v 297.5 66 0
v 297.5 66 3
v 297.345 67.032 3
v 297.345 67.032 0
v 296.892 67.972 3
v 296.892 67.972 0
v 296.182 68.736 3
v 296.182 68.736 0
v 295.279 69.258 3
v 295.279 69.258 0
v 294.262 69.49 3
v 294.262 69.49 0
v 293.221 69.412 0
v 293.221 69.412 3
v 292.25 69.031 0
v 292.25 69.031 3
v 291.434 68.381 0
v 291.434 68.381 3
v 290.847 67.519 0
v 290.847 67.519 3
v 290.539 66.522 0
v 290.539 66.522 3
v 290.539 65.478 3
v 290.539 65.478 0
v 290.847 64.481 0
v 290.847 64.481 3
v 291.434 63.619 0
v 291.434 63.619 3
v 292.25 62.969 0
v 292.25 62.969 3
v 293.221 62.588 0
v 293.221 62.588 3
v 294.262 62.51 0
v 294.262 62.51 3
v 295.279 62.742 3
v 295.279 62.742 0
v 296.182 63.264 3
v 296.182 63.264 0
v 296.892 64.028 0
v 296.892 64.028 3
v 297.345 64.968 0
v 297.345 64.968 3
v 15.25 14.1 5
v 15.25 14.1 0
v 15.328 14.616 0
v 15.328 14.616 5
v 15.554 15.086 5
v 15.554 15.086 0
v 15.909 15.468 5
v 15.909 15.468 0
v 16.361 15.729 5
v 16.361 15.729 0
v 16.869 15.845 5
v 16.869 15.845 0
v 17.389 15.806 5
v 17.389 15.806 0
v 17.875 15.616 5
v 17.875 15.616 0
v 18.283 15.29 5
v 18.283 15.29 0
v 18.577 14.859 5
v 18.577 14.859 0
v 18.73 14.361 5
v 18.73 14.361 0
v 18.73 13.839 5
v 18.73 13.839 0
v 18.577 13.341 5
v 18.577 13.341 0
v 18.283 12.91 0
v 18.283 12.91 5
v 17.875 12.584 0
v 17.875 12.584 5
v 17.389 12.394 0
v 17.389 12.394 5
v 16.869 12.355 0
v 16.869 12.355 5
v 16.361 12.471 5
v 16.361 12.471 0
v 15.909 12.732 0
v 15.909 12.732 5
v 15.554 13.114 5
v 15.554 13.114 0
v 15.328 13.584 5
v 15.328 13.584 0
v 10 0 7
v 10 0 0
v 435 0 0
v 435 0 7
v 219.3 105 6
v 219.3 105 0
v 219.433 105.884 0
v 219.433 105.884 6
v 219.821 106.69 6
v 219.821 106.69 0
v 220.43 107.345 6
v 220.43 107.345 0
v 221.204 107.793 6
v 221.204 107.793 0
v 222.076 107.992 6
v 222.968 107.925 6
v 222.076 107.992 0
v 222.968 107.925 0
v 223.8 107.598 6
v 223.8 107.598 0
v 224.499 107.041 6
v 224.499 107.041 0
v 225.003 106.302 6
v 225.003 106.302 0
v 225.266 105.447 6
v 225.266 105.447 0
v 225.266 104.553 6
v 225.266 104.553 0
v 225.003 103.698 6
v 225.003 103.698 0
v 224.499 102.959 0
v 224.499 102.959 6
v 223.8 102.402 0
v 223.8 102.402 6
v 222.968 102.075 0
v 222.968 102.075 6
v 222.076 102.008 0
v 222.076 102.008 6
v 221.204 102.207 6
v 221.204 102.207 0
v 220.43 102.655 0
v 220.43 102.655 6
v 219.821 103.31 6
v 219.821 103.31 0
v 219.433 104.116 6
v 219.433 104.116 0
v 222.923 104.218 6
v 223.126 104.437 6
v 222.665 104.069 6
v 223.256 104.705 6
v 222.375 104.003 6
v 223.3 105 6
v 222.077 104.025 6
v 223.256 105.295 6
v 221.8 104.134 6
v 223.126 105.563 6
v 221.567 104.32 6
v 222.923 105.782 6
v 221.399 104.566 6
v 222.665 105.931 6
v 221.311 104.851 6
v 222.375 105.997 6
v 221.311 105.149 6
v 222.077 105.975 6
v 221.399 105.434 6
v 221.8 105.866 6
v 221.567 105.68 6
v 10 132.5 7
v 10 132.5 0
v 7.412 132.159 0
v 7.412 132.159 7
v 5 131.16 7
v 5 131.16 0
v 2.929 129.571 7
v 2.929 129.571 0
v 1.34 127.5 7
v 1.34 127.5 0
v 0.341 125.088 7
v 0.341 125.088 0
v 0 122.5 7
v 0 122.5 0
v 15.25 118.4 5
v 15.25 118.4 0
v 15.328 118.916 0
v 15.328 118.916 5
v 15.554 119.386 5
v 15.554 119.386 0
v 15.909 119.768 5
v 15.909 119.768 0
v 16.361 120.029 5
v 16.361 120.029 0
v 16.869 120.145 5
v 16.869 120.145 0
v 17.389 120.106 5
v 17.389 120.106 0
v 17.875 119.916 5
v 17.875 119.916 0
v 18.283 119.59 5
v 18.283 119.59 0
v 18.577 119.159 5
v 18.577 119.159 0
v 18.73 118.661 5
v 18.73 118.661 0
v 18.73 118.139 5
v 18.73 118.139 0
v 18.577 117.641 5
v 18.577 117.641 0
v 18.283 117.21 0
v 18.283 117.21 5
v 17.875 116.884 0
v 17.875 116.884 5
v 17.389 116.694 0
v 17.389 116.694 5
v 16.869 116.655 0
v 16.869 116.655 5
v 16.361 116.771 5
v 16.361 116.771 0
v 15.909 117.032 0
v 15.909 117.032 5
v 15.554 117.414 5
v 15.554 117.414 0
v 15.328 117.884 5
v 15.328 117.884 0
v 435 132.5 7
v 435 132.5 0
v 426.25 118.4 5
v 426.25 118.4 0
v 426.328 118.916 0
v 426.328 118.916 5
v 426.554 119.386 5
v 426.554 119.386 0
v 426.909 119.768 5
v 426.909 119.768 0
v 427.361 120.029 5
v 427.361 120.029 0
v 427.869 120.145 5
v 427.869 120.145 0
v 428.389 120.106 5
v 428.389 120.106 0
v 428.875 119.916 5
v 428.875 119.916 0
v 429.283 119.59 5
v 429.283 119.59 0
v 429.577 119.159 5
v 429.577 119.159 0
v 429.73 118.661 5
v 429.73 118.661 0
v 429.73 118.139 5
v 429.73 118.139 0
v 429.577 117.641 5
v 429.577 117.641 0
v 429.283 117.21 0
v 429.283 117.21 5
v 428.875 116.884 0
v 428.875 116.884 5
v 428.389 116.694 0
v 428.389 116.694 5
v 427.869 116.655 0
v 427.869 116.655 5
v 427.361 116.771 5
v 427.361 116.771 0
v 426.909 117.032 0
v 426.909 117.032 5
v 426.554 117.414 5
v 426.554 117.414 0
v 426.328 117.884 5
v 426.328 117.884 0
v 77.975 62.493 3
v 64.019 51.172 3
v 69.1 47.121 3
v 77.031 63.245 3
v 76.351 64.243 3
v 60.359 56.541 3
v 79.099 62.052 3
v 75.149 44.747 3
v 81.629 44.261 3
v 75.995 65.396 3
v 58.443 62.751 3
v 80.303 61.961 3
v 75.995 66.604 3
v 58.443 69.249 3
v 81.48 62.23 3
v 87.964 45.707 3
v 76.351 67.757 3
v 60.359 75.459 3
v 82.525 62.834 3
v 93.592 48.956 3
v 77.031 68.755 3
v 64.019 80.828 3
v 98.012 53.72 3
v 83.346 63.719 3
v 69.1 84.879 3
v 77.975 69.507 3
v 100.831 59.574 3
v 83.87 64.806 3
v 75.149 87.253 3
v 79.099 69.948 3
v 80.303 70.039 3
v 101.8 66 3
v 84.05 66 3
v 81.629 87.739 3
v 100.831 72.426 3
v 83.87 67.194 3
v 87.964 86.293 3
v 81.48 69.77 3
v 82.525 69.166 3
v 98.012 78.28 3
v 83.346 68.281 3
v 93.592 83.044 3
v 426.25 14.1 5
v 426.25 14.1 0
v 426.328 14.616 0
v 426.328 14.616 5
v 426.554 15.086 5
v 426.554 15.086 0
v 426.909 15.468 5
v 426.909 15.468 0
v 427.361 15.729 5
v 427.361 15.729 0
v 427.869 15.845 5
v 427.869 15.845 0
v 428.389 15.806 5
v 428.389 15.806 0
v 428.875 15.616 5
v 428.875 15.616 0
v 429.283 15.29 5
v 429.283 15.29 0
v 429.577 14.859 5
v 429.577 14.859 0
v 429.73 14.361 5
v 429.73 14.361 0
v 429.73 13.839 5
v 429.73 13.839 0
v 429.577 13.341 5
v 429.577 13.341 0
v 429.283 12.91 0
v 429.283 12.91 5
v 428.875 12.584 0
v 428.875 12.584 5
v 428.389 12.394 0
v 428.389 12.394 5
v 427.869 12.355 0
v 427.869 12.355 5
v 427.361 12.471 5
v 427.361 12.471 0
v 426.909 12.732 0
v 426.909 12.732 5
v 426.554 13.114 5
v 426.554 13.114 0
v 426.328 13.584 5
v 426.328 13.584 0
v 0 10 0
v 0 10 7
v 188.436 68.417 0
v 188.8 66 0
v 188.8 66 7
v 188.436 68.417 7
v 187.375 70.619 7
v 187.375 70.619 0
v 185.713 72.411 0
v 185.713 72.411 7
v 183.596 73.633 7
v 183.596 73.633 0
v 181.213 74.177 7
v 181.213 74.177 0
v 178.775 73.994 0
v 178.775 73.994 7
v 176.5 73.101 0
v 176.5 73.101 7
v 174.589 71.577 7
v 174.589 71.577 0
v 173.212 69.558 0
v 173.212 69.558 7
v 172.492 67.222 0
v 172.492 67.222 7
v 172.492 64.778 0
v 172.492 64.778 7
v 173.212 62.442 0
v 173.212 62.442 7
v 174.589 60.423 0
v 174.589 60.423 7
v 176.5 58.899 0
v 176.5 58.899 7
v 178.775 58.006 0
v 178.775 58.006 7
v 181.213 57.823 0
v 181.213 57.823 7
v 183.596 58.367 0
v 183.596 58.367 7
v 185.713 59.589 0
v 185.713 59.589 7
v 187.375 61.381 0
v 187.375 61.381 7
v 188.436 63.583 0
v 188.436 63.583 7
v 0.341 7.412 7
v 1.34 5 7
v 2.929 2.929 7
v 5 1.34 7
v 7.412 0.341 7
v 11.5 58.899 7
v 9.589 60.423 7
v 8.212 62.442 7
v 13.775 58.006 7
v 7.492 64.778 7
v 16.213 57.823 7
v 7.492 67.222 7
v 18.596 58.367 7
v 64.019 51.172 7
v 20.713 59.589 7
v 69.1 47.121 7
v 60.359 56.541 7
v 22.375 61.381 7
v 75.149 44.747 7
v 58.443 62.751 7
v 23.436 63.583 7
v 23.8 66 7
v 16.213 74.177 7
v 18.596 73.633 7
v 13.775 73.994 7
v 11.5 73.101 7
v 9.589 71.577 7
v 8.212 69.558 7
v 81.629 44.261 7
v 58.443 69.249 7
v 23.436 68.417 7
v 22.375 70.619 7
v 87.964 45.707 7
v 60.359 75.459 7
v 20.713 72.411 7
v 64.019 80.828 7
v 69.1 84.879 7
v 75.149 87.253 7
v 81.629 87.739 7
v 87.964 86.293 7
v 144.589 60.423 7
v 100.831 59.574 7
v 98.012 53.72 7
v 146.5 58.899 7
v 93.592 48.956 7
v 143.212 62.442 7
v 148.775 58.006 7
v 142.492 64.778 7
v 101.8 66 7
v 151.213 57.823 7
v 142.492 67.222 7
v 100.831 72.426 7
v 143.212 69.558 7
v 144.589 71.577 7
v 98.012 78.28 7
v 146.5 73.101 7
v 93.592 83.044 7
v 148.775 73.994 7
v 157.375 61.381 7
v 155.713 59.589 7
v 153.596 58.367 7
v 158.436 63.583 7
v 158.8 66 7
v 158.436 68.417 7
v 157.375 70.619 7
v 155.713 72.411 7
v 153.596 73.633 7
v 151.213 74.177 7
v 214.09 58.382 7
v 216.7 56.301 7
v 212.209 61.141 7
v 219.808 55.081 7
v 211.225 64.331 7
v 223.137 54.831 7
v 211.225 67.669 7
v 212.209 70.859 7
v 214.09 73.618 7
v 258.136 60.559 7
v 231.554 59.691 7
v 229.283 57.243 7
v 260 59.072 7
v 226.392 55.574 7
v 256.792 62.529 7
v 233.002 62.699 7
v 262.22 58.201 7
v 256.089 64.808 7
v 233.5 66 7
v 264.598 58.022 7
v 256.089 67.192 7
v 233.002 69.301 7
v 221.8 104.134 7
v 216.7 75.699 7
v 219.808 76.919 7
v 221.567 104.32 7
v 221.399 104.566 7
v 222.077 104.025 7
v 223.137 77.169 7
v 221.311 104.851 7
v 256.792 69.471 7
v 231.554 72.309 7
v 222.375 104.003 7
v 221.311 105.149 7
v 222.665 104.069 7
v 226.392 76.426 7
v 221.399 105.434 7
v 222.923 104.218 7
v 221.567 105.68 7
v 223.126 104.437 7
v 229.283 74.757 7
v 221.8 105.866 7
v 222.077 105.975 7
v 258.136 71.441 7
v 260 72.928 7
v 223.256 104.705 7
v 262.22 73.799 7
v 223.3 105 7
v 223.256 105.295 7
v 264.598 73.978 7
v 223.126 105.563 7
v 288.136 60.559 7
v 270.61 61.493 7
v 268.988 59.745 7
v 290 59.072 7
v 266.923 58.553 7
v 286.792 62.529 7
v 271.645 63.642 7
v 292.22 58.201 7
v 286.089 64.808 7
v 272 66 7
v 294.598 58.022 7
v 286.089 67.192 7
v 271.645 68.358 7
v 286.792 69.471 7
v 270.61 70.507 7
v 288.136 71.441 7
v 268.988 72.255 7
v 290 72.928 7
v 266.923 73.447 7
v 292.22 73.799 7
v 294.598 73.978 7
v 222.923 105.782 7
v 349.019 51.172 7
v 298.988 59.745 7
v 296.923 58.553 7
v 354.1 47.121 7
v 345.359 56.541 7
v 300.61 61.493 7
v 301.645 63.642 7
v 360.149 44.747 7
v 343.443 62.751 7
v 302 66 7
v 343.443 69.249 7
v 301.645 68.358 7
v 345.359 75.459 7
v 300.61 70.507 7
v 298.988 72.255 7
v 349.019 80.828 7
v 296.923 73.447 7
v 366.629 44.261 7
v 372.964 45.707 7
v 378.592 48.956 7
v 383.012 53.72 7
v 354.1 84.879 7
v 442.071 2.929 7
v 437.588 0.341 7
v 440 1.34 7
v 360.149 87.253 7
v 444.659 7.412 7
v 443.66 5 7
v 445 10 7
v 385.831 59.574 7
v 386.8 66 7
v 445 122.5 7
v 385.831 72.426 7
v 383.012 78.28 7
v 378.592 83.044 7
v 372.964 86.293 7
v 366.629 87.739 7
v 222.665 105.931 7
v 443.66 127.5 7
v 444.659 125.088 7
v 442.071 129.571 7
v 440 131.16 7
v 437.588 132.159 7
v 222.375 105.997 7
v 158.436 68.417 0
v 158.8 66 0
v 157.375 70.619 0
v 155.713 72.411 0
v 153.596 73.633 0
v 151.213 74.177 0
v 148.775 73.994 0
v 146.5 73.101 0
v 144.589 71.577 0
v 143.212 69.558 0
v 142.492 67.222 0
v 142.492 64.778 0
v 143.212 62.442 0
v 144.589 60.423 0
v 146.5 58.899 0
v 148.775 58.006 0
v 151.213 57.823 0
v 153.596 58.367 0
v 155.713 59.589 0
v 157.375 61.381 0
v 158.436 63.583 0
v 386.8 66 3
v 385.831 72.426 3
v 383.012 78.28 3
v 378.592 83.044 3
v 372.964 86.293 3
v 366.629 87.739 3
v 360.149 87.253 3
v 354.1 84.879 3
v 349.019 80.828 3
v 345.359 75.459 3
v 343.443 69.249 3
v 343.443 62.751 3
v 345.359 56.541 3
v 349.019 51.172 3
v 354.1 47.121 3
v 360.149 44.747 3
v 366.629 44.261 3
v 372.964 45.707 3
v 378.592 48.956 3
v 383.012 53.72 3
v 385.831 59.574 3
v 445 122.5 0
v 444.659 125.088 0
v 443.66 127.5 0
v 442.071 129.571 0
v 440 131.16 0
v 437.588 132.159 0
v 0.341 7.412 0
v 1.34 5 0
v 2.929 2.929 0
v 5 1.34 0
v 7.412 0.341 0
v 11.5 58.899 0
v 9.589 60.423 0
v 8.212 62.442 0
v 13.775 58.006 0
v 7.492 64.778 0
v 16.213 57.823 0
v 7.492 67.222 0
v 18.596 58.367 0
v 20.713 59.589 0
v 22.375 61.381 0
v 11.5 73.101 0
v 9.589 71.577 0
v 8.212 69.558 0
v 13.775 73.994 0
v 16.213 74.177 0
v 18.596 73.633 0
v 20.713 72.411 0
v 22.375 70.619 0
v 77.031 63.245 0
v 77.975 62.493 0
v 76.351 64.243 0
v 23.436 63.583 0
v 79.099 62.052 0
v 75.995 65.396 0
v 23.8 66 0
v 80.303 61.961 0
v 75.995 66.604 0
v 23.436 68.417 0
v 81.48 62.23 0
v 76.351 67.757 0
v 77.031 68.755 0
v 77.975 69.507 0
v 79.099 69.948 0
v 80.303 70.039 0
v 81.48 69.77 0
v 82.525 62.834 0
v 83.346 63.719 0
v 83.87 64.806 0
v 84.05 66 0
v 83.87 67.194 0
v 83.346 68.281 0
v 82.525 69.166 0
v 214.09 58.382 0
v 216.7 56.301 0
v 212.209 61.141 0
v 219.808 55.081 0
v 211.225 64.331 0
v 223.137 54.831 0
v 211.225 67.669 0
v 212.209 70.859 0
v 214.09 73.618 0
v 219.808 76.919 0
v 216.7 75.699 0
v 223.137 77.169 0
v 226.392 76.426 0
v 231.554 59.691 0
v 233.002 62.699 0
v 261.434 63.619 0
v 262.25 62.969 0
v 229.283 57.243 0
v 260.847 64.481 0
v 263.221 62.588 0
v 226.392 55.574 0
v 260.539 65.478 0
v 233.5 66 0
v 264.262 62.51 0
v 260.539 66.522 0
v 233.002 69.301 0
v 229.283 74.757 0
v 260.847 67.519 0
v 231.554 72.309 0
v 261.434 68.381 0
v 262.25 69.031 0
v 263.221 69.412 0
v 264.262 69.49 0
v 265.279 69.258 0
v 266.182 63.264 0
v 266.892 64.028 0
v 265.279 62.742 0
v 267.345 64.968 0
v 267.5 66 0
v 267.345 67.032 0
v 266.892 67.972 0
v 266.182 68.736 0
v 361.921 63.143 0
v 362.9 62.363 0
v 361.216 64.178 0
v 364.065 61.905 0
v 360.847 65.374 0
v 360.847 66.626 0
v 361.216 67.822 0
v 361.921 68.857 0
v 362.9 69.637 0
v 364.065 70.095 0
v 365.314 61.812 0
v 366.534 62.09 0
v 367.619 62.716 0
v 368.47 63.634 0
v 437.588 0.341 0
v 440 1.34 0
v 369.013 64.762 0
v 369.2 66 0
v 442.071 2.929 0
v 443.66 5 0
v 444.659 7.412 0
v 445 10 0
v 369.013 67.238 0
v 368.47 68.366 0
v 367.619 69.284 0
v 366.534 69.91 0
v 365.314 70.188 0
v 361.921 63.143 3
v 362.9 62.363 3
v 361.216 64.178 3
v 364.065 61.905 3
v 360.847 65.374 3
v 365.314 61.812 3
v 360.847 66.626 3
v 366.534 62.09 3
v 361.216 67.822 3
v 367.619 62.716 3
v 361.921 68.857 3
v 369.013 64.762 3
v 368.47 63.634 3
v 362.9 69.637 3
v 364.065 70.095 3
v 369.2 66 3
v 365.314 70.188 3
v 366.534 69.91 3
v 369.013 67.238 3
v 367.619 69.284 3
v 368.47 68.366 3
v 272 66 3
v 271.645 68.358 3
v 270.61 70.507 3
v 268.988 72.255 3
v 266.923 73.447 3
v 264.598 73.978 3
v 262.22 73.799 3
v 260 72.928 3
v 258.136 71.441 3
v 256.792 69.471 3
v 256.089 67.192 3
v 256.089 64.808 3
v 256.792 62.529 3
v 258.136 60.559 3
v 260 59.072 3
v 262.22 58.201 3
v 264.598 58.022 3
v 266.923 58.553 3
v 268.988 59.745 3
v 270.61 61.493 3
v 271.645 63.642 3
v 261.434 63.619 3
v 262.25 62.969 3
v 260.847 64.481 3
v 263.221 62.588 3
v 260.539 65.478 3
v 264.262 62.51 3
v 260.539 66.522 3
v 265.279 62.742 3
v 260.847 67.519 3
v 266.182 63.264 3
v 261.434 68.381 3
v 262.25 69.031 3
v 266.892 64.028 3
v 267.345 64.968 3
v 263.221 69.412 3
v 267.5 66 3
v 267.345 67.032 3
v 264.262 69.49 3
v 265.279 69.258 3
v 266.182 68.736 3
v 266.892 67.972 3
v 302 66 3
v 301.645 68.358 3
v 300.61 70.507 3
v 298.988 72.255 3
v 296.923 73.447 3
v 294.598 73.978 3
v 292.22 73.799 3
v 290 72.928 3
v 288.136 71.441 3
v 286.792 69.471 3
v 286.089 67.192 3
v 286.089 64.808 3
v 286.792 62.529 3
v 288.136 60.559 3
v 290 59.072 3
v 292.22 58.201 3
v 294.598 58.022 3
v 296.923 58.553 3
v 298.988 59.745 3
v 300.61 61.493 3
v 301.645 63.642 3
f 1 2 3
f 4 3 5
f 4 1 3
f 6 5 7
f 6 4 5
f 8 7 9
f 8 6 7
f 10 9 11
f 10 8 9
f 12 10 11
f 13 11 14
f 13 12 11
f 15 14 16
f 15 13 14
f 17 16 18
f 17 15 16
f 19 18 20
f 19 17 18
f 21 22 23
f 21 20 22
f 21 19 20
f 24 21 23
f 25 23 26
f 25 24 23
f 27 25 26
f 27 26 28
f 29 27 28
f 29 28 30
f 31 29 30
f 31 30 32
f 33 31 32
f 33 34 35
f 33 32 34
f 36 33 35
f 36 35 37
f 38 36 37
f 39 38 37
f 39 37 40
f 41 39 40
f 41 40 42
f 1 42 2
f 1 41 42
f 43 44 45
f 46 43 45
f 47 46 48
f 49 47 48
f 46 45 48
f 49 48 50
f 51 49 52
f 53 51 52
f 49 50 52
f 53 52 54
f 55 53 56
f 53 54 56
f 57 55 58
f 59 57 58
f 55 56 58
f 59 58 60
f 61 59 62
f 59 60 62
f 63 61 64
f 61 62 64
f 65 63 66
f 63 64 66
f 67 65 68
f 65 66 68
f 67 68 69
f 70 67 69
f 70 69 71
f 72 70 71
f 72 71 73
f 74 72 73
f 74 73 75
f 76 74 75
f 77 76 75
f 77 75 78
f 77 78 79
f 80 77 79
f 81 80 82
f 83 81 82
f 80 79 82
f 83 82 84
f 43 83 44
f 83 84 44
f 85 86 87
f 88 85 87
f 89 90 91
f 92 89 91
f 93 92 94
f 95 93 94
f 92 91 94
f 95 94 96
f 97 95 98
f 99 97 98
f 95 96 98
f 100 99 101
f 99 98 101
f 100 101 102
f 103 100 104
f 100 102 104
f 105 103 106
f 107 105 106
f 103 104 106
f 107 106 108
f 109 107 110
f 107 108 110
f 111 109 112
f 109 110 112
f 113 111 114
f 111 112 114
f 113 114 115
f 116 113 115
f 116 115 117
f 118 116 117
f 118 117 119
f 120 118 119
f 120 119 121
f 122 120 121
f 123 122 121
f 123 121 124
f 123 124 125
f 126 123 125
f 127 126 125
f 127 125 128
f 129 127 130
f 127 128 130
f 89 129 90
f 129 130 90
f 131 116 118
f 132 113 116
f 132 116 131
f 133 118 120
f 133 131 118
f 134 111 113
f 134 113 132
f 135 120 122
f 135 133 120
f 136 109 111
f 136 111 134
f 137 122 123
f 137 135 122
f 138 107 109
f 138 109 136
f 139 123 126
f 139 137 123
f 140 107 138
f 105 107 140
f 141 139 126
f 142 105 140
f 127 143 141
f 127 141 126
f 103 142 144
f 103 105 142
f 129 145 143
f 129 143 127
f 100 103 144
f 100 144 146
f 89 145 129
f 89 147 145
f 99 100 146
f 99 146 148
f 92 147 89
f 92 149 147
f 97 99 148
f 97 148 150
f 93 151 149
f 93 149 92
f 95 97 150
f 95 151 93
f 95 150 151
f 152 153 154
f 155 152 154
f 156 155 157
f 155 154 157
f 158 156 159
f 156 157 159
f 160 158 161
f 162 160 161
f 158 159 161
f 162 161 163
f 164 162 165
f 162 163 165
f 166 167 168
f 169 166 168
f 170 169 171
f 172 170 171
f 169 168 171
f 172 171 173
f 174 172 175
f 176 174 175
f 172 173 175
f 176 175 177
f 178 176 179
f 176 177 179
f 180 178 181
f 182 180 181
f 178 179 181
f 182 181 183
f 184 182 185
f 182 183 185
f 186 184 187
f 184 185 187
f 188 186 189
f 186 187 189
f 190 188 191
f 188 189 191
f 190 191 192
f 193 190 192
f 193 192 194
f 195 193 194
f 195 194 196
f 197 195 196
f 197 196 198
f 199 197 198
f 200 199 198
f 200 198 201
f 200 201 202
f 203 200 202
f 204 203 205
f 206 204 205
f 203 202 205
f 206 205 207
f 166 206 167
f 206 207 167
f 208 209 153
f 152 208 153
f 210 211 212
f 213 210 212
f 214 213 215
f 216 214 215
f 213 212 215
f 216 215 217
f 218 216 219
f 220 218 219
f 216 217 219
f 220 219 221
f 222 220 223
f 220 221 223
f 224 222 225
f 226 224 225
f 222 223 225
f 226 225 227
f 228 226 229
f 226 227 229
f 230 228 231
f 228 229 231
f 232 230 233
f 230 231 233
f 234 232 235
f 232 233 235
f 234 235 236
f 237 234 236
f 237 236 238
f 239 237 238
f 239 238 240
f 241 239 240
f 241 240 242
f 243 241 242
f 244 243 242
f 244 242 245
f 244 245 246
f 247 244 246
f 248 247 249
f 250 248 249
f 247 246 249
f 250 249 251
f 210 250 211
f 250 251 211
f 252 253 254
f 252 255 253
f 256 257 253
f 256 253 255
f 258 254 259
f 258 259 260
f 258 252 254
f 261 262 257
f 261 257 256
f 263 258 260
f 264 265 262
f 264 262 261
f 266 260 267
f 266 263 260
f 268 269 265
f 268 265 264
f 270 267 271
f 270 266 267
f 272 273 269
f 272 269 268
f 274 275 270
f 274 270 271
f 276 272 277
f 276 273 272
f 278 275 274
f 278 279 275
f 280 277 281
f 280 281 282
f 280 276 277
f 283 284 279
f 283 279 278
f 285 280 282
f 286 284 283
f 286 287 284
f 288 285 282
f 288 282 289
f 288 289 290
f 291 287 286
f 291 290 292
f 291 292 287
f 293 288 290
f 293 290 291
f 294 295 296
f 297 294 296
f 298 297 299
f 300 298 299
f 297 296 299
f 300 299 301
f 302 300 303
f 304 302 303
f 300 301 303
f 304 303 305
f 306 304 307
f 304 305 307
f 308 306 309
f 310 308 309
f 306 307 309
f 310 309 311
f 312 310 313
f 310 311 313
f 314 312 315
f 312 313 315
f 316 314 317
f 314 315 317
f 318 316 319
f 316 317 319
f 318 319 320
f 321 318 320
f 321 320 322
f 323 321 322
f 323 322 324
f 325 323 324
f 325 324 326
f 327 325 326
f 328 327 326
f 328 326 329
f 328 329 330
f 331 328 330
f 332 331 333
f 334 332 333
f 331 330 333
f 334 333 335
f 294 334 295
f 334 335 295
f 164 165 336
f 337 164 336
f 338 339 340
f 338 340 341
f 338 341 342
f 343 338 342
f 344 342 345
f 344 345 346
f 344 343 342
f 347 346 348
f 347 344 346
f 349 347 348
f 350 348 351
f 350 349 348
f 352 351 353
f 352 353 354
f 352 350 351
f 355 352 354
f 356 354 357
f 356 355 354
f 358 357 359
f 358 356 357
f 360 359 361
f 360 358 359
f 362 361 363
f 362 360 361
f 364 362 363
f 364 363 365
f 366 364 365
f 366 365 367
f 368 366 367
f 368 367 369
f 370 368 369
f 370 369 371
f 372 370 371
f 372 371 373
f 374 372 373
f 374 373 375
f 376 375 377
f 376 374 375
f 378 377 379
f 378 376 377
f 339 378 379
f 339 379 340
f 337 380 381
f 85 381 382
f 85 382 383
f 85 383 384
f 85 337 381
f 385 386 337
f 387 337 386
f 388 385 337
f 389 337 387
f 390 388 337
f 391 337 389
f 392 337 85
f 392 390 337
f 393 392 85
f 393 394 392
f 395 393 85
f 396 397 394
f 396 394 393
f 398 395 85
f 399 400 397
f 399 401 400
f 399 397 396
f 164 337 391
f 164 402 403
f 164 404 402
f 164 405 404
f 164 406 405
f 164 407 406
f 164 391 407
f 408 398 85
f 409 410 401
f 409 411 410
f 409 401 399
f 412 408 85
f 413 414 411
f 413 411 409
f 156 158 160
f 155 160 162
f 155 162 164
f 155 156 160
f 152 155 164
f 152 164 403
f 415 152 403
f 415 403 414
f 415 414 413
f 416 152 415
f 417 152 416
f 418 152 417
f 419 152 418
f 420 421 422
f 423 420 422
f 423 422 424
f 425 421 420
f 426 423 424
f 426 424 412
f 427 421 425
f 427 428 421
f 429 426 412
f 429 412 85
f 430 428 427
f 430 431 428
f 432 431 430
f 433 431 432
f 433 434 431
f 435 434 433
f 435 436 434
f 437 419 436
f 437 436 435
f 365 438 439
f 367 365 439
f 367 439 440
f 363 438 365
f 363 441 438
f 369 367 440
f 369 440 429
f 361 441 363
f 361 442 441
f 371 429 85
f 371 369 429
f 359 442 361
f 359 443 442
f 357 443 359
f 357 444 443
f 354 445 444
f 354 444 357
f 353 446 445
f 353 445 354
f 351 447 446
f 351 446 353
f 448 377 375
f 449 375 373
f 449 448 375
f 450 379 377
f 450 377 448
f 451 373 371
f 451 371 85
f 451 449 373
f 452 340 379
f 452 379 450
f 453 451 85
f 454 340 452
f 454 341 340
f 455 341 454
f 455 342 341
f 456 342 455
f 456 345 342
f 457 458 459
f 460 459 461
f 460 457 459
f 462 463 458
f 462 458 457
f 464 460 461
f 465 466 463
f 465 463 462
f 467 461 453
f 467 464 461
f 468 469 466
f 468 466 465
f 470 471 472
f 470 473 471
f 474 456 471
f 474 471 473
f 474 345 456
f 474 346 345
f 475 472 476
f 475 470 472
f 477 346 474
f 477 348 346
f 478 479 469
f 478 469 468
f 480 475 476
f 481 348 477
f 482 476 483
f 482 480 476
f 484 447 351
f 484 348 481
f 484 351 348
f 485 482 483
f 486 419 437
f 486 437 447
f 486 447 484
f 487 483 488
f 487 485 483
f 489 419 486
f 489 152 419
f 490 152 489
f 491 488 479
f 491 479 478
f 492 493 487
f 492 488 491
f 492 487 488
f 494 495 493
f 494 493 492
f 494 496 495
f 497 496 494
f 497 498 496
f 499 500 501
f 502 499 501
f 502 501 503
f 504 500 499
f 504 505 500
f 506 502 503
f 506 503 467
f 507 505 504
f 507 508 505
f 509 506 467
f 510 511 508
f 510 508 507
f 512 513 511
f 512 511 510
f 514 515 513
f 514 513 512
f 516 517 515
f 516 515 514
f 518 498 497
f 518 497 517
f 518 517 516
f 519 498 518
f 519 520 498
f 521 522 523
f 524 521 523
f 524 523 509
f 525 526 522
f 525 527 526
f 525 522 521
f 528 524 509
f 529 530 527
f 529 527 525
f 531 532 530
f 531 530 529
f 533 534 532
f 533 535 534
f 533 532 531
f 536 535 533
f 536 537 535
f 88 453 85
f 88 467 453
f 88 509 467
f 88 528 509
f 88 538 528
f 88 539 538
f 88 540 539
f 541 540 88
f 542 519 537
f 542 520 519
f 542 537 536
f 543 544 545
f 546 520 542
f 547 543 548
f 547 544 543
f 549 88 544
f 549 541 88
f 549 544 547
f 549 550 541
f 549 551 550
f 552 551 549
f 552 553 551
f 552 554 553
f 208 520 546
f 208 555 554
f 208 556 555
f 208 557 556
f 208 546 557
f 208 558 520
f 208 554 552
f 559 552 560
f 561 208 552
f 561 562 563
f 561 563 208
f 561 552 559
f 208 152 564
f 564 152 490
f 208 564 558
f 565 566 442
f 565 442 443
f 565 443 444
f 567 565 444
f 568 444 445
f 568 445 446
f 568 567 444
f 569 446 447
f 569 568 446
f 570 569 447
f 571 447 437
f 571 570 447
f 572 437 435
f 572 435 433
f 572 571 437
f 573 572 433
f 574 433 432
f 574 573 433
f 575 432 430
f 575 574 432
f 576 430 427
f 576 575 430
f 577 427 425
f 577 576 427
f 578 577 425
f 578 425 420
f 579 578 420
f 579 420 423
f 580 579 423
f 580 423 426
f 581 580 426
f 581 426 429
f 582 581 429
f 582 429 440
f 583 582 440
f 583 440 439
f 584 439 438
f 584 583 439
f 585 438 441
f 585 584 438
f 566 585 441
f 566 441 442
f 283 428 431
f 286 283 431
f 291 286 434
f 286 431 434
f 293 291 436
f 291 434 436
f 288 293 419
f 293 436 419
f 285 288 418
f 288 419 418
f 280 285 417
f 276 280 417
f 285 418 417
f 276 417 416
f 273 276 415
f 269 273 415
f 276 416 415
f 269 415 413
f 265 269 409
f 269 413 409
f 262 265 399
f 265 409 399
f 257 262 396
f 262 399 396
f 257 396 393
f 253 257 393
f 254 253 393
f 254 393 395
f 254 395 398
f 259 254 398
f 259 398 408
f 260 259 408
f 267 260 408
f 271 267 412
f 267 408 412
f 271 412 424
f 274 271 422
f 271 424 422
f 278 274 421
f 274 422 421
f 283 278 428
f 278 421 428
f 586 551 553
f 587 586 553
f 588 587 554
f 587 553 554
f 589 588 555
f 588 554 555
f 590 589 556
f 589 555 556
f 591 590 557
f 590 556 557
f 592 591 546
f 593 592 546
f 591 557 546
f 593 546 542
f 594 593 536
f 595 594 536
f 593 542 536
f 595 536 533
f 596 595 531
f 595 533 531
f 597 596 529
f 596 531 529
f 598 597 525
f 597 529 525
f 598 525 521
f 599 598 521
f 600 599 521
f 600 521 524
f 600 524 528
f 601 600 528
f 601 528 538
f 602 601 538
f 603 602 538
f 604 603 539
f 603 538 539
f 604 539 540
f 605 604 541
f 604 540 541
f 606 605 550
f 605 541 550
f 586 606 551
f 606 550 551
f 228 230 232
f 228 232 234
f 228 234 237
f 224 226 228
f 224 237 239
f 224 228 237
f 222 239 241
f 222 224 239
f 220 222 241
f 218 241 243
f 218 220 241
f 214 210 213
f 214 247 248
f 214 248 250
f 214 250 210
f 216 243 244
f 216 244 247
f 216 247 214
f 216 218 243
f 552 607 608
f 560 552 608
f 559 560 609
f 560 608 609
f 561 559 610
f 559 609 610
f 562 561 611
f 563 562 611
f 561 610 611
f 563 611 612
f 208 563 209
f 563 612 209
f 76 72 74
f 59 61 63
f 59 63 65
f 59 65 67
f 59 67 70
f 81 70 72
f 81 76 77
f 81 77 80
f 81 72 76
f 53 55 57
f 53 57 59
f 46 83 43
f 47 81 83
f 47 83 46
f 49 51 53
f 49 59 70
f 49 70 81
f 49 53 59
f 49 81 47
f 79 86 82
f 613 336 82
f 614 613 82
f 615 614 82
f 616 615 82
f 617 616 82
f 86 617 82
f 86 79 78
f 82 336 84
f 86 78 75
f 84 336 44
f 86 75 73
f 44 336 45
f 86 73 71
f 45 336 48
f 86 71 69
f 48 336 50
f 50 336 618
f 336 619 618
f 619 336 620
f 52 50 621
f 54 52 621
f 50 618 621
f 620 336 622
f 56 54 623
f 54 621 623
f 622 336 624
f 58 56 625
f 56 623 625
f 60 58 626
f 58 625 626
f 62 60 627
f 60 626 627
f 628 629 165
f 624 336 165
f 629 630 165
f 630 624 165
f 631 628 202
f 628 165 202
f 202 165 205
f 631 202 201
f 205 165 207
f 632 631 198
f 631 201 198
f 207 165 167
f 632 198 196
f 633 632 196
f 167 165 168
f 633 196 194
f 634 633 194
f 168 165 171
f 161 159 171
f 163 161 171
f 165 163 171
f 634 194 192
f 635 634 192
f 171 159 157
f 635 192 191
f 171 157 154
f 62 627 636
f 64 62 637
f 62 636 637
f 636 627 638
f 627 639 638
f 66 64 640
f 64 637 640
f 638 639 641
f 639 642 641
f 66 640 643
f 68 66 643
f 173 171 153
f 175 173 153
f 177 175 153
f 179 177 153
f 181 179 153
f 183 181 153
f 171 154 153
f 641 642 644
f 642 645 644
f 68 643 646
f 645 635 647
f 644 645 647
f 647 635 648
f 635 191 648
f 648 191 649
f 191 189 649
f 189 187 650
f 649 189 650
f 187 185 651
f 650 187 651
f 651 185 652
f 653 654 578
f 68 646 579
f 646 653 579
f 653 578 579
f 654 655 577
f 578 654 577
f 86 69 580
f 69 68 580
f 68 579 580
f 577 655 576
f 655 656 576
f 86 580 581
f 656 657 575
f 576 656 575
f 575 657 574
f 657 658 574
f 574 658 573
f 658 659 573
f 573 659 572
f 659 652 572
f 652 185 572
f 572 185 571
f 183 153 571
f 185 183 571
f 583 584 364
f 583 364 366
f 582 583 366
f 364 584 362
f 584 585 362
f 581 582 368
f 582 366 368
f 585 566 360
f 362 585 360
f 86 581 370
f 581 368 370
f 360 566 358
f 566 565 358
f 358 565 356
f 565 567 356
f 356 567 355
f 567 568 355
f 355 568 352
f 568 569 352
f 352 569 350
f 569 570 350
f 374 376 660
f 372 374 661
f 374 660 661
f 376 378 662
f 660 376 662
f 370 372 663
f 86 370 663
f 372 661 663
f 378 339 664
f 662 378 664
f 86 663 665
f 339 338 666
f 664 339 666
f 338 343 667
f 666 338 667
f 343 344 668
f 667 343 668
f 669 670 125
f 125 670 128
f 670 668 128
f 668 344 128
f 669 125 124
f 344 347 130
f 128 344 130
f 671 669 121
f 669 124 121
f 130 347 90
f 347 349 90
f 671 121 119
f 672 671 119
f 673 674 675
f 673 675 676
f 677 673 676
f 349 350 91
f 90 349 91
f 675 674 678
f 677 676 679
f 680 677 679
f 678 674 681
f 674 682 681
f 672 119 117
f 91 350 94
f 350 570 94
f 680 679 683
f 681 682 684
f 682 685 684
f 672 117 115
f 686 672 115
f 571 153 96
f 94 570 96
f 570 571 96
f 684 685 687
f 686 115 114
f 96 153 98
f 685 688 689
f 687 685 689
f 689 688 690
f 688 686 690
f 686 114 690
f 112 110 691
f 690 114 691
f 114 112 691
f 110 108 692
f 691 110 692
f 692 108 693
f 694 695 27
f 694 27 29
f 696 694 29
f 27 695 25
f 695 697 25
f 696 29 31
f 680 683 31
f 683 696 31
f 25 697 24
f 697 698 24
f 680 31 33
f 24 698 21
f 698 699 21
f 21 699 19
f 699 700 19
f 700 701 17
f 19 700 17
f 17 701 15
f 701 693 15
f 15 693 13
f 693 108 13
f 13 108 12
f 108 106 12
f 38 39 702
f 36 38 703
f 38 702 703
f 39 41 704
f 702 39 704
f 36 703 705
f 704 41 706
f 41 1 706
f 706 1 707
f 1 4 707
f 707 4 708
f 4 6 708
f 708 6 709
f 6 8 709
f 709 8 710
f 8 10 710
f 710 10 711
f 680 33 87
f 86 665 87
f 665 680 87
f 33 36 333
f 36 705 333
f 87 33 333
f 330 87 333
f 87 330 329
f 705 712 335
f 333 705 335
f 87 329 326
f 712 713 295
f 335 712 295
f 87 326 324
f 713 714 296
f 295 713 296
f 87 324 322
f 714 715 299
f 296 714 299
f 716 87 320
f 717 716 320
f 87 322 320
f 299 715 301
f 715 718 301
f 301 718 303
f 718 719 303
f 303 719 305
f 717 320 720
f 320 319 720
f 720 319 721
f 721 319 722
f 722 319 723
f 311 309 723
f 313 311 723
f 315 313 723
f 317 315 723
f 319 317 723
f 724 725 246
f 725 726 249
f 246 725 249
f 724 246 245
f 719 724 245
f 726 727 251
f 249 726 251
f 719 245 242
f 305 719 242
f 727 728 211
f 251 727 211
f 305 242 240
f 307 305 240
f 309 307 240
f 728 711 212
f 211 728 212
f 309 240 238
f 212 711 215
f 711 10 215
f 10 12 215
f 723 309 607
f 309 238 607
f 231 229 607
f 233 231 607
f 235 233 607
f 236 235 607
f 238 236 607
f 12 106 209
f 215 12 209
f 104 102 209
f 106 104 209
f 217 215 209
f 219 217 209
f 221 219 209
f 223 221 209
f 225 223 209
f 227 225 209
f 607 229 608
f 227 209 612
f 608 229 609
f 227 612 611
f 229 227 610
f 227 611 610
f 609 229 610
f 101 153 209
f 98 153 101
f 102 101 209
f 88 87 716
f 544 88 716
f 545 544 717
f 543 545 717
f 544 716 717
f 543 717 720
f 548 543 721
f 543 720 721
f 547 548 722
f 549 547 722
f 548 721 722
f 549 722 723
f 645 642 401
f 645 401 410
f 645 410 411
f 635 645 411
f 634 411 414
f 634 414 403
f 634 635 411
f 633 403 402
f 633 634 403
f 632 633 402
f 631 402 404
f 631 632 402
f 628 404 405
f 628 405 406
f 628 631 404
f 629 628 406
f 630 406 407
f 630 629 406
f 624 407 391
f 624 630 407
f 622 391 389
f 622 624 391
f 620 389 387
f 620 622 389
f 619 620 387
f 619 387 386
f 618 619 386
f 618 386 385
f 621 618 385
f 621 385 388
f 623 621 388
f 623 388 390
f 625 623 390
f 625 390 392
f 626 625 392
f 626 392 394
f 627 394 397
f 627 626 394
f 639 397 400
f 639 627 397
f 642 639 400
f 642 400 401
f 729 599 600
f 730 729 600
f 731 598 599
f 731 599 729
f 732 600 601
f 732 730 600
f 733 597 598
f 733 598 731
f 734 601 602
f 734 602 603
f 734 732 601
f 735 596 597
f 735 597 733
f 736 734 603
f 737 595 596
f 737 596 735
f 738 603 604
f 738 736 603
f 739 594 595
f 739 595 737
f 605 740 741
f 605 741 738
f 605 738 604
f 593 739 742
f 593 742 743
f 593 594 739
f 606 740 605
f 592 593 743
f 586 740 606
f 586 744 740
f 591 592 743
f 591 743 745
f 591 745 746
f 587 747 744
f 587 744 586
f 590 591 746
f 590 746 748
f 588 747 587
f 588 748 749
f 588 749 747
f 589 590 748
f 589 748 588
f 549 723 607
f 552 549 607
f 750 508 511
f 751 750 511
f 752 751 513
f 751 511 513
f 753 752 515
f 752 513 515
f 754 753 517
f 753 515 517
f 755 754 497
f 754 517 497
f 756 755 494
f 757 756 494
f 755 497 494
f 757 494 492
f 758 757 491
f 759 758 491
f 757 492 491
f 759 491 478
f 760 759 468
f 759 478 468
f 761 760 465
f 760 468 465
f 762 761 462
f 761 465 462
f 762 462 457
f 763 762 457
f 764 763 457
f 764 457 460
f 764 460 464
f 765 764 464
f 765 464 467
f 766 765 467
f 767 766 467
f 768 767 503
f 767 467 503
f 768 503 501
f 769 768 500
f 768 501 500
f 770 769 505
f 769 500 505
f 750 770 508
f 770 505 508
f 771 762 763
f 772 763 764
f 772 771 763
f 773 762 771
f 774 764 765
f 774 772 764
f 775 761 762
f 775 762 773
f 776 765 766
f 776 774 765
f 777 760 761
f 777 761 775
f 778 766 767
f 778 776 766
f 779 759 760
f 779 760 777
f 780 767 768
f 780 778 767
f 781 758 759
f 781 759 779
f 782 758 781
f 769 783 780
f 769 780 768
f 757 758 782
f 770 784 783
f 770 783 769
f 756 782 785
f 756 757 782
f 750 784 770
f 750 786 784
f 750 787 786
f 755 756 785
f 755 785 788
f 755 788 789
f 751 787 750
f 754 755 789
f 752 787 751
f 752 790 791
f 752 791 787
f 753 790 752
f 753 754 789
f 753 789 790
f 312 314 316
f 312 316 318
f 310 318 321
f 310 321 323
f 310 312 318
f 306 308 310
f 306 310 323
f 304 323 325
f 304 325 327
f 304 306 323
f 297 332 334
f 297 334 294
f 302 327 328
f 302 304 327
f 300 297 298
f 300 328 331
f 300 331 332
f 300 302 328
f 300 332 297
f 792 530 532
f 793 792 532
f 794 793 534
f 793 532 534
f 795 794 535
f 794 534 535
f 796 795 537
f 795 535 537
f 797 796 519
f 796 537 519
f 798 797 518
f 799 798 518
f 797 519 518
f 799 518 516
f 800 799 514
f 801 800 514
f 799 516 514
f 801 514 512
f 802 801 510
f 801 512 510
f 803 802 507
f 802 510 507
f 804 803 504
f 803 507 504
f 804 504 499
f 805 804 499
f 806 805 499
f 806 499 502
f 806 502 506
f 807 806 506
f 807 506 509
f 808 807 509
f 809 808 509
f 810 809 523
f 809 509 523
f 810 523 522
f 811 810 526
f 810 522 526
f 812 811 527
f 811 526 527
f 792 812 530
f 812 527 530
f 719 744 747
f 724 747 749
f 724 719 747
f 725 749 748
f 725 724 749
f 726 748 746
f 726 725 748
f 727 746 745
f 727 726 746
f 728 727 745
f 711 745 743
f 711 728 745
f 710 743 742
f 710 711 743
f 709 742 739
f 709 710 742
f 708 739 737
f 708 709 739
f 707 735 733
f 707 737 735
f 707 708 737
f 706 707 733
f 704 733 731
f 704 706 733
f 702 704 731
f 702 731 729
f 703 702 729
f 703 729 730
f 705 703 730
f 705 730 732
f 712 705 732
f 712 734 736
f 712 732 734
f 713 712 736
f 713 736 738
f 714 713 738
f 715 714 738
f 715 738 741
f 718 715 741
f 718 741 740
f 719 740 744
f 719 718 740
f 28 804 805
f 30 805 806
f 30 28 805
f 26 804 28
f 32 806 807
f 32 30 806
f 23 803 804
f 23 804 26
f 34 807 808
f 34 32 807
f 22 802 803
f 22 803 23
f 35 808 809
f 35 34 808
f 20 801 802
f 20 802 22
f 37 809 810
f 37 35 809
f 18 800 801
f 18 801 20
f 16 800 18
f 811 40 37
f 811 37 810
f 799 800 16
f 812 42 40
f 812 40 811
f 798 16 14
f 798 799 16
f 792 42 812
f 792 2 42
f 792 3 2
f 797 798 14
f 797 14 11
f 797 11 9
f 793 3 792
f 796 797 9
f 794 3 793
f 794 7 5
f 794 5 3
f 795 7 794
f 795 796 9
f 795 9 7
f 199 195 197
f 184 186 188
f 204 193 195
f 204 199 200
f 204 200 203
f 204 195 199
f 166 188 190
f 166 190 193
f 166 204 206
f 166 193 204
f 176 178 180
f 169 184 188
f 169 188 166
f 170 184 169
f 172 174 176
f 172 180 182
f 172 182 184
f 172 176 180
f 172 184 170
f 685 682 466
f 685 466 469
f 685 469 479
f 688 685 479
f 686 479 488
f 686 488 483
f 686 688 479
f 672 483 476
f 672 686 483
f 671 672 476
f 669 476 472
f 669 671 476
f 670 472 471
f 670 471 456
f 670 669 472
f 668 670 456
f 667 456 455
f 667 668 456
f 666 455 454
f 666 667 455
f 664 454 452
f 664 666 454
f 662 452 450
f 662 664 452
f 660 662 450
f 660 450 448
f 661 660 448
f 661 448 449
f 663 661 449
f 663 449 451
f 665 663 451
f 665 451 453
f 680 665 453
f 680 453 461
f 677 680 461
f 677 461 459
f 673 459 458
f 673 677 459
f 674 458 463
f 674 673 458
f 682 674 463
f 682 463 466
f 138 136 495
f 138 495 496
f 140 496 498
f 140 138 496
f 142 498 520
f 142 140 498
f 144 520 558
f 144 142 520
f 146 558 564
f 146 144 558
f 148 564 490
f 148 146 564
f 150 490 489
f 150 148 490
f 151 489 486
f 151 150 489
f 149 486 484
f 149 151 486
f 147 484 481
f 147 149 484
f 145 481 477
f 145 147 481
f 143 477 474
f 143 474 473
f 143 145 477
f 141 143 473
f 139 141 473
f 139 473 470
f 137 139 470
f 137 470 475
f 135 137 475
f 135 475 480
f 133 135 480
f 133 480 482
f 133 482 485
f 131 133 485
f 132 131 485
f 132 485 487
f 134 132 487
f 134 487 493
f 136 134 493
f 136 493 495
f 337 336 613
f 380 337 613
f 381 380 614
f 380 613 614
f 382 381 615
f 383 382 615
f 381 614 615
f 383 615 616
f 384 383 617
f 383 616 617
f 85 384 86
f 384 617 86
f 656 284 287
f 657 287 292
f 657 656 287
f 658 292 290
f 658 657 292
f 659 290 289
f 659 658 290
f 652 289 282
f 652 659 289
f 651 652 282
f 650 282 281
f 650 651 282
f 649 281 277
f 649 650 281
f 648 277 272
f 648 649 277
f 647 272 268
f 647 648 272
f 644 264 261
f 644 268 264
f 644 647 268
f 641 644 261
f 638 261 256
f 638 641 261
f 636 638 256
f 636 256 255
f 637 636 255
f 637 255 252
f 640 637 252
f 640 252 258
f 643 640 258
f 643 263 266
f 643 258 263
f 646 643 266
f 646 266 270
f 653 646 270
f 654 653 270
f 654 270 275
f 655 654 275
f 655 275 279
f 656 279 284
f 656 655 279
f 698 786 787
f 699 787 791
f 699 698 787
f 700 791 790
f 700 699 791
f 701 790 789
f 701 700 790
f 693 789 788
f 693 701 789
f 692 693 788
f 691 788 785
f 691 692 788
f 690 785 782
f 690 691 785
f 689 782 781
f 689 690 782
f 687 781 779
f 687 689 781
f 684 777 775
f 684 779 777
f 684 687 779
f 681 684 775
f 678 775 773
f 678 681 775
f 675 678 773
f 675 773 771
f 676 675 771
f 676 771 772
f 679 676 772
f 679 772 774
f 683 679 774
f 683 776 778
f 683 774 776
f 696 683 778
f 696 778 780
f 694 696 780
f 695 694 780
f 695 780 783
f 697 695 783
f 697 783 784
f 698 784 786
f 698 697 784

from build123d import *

# Parameters (mm, degrees)
SKETCH_1_R            = 1
SKETCH_1_R_2          = 11.2
SKETCH_1_R_3          = 4.05
SKETCH_1_R_4          = 3.5
SKETCH_1_R_5          = 8.2
SKETCH_1_R_6          = 4.2
EXTRUDE_1_DEPTH       = 7
SKETCH_6_R            = 21.8
SKETCH_6_R_2          = 8
CUT_EXTRUDE_3_DEPTH   = 4
SKETCH_7_R            = 3
CUT_EXTRUDE_4_DEPTH   = 6
SKETCH_13_R           = 1.75
CUT_EXTRUDE_4_2_DEPTH = 5


with BuildPart() as part:
    # Эскиз1 → Бобышка-Вытянуть1 (new body)
    with BuildSketch(Plane.XY):
        with BuildLine():
            Line((10, 0), (435, 0))
            ThreePointArc((435, 0), (442.071067812, 2.928932188), (445, 10))
            Line((445, 10), (445, 122.5))
            ThreePointArc((445, 122.5), (442.071067812, 129.571067812), (435, 132.5))
            Line((435, 132.5), (10, 132.5))
            ThreePointArc((10, 132.5), (2.928932188, 129.571067812), (0, 122.5))
            Line((0, 122.5), (0, 10))
            ThreePointArc((0, 10), (2.928932188, 2.928932188), (10, 0))
        make_face()
        with Locations((222.3, 105)):
            Circle(SKETCH_1_R, mode=Mode.SUBTRACT)
        with Locations((222.3, 66)):
            Circle(SKETCH_1_R_2, mode=Mode.SUBTRACT)
        with Locations((80, 66)):
            Circle(SKETCH_1_R_3, mode=Mode.SUBTRACT)
        with Locations((264, 66)):
            Circle(SKETCH_1_R_4, mode=Mode.SUBTRACT)
        with Locations((294, 66)):
            Circle(SKETCH_1_R_4, mode=Mode.SUBTRACT)
        with Locations((180.6, 66)):
            Circle(SKETCH_1_R_5, mode=Mode.SUBTRACT)
        with Locations((365, 66)):
            Circle(SKETCH_1_R_6, mode=Mode.SUBTRACT)
        with Locations((15.6, 66)):
            Circle(SKETCH_1_R_5, mode=Mode.SUBTRACT)
        with Locations((150.6, 66)):
            Circle(SKETCH_1_R_5, mode=Mode.SUBTRACT)
    extrude(amount=EXTRUDE_1_DEPTH)

    # Эскиз6 → Вырез-Вытянуть3 (cut)
    with BuildSketch(Plane.XY.offset(7)):
        with Locations((80, 66)):
            Circle(SKETCH_6_R)
        with Locations((365, 66)):
            Circle(SKETCH_6_R)
        with Locations((264, 66)):
            Circle(SKETCH_6_R_2)
        with Locations((294, 66)):
            Circle(SKETCH_6_R_2)
    extrude(amount=-CUT_EXTRUDE_3_DEPTH, mode=Mode.SUBTRACT)

    # Эскиз7 → Cut-Extrude 4 (cut)
    with BuildSketch(Plane(origin=(0, 0, 0), x_dir=(-1, 0, 0), z_dir=(0, 0, -1))):
        with Locations((-222.3, 105)):
            Circle(SKETCH_7_R)
    extrude(amount=-CUT_EXTRUDE_4_DEPTH, mode=Mode.SUBTRACT)

    # Эскиз13 → Cut-Extrude 4 2 (cut)
    with BuildSketch(Plane(origin=(0, 0, 0), x_dir=(-1, 0, 0), z_dir=(0, 0, -1))):
        with Locations((-17, 118.4)):
            Circle(SKETCH_13_R)
        with Locations((-17, 14.1)):
            Circle(SKETCH_13_R)
        with Locations((-428, 14.1)):
            Circle(SKETCH_13_R)
        with Locations((-428, 118.4)):
            Circle(SKETCH_13_R)
    extrude(amount=-CUT_EXTRUDE_4_2_DEPTH, mode=Mode.SUBTRACT)


solid = part.part
